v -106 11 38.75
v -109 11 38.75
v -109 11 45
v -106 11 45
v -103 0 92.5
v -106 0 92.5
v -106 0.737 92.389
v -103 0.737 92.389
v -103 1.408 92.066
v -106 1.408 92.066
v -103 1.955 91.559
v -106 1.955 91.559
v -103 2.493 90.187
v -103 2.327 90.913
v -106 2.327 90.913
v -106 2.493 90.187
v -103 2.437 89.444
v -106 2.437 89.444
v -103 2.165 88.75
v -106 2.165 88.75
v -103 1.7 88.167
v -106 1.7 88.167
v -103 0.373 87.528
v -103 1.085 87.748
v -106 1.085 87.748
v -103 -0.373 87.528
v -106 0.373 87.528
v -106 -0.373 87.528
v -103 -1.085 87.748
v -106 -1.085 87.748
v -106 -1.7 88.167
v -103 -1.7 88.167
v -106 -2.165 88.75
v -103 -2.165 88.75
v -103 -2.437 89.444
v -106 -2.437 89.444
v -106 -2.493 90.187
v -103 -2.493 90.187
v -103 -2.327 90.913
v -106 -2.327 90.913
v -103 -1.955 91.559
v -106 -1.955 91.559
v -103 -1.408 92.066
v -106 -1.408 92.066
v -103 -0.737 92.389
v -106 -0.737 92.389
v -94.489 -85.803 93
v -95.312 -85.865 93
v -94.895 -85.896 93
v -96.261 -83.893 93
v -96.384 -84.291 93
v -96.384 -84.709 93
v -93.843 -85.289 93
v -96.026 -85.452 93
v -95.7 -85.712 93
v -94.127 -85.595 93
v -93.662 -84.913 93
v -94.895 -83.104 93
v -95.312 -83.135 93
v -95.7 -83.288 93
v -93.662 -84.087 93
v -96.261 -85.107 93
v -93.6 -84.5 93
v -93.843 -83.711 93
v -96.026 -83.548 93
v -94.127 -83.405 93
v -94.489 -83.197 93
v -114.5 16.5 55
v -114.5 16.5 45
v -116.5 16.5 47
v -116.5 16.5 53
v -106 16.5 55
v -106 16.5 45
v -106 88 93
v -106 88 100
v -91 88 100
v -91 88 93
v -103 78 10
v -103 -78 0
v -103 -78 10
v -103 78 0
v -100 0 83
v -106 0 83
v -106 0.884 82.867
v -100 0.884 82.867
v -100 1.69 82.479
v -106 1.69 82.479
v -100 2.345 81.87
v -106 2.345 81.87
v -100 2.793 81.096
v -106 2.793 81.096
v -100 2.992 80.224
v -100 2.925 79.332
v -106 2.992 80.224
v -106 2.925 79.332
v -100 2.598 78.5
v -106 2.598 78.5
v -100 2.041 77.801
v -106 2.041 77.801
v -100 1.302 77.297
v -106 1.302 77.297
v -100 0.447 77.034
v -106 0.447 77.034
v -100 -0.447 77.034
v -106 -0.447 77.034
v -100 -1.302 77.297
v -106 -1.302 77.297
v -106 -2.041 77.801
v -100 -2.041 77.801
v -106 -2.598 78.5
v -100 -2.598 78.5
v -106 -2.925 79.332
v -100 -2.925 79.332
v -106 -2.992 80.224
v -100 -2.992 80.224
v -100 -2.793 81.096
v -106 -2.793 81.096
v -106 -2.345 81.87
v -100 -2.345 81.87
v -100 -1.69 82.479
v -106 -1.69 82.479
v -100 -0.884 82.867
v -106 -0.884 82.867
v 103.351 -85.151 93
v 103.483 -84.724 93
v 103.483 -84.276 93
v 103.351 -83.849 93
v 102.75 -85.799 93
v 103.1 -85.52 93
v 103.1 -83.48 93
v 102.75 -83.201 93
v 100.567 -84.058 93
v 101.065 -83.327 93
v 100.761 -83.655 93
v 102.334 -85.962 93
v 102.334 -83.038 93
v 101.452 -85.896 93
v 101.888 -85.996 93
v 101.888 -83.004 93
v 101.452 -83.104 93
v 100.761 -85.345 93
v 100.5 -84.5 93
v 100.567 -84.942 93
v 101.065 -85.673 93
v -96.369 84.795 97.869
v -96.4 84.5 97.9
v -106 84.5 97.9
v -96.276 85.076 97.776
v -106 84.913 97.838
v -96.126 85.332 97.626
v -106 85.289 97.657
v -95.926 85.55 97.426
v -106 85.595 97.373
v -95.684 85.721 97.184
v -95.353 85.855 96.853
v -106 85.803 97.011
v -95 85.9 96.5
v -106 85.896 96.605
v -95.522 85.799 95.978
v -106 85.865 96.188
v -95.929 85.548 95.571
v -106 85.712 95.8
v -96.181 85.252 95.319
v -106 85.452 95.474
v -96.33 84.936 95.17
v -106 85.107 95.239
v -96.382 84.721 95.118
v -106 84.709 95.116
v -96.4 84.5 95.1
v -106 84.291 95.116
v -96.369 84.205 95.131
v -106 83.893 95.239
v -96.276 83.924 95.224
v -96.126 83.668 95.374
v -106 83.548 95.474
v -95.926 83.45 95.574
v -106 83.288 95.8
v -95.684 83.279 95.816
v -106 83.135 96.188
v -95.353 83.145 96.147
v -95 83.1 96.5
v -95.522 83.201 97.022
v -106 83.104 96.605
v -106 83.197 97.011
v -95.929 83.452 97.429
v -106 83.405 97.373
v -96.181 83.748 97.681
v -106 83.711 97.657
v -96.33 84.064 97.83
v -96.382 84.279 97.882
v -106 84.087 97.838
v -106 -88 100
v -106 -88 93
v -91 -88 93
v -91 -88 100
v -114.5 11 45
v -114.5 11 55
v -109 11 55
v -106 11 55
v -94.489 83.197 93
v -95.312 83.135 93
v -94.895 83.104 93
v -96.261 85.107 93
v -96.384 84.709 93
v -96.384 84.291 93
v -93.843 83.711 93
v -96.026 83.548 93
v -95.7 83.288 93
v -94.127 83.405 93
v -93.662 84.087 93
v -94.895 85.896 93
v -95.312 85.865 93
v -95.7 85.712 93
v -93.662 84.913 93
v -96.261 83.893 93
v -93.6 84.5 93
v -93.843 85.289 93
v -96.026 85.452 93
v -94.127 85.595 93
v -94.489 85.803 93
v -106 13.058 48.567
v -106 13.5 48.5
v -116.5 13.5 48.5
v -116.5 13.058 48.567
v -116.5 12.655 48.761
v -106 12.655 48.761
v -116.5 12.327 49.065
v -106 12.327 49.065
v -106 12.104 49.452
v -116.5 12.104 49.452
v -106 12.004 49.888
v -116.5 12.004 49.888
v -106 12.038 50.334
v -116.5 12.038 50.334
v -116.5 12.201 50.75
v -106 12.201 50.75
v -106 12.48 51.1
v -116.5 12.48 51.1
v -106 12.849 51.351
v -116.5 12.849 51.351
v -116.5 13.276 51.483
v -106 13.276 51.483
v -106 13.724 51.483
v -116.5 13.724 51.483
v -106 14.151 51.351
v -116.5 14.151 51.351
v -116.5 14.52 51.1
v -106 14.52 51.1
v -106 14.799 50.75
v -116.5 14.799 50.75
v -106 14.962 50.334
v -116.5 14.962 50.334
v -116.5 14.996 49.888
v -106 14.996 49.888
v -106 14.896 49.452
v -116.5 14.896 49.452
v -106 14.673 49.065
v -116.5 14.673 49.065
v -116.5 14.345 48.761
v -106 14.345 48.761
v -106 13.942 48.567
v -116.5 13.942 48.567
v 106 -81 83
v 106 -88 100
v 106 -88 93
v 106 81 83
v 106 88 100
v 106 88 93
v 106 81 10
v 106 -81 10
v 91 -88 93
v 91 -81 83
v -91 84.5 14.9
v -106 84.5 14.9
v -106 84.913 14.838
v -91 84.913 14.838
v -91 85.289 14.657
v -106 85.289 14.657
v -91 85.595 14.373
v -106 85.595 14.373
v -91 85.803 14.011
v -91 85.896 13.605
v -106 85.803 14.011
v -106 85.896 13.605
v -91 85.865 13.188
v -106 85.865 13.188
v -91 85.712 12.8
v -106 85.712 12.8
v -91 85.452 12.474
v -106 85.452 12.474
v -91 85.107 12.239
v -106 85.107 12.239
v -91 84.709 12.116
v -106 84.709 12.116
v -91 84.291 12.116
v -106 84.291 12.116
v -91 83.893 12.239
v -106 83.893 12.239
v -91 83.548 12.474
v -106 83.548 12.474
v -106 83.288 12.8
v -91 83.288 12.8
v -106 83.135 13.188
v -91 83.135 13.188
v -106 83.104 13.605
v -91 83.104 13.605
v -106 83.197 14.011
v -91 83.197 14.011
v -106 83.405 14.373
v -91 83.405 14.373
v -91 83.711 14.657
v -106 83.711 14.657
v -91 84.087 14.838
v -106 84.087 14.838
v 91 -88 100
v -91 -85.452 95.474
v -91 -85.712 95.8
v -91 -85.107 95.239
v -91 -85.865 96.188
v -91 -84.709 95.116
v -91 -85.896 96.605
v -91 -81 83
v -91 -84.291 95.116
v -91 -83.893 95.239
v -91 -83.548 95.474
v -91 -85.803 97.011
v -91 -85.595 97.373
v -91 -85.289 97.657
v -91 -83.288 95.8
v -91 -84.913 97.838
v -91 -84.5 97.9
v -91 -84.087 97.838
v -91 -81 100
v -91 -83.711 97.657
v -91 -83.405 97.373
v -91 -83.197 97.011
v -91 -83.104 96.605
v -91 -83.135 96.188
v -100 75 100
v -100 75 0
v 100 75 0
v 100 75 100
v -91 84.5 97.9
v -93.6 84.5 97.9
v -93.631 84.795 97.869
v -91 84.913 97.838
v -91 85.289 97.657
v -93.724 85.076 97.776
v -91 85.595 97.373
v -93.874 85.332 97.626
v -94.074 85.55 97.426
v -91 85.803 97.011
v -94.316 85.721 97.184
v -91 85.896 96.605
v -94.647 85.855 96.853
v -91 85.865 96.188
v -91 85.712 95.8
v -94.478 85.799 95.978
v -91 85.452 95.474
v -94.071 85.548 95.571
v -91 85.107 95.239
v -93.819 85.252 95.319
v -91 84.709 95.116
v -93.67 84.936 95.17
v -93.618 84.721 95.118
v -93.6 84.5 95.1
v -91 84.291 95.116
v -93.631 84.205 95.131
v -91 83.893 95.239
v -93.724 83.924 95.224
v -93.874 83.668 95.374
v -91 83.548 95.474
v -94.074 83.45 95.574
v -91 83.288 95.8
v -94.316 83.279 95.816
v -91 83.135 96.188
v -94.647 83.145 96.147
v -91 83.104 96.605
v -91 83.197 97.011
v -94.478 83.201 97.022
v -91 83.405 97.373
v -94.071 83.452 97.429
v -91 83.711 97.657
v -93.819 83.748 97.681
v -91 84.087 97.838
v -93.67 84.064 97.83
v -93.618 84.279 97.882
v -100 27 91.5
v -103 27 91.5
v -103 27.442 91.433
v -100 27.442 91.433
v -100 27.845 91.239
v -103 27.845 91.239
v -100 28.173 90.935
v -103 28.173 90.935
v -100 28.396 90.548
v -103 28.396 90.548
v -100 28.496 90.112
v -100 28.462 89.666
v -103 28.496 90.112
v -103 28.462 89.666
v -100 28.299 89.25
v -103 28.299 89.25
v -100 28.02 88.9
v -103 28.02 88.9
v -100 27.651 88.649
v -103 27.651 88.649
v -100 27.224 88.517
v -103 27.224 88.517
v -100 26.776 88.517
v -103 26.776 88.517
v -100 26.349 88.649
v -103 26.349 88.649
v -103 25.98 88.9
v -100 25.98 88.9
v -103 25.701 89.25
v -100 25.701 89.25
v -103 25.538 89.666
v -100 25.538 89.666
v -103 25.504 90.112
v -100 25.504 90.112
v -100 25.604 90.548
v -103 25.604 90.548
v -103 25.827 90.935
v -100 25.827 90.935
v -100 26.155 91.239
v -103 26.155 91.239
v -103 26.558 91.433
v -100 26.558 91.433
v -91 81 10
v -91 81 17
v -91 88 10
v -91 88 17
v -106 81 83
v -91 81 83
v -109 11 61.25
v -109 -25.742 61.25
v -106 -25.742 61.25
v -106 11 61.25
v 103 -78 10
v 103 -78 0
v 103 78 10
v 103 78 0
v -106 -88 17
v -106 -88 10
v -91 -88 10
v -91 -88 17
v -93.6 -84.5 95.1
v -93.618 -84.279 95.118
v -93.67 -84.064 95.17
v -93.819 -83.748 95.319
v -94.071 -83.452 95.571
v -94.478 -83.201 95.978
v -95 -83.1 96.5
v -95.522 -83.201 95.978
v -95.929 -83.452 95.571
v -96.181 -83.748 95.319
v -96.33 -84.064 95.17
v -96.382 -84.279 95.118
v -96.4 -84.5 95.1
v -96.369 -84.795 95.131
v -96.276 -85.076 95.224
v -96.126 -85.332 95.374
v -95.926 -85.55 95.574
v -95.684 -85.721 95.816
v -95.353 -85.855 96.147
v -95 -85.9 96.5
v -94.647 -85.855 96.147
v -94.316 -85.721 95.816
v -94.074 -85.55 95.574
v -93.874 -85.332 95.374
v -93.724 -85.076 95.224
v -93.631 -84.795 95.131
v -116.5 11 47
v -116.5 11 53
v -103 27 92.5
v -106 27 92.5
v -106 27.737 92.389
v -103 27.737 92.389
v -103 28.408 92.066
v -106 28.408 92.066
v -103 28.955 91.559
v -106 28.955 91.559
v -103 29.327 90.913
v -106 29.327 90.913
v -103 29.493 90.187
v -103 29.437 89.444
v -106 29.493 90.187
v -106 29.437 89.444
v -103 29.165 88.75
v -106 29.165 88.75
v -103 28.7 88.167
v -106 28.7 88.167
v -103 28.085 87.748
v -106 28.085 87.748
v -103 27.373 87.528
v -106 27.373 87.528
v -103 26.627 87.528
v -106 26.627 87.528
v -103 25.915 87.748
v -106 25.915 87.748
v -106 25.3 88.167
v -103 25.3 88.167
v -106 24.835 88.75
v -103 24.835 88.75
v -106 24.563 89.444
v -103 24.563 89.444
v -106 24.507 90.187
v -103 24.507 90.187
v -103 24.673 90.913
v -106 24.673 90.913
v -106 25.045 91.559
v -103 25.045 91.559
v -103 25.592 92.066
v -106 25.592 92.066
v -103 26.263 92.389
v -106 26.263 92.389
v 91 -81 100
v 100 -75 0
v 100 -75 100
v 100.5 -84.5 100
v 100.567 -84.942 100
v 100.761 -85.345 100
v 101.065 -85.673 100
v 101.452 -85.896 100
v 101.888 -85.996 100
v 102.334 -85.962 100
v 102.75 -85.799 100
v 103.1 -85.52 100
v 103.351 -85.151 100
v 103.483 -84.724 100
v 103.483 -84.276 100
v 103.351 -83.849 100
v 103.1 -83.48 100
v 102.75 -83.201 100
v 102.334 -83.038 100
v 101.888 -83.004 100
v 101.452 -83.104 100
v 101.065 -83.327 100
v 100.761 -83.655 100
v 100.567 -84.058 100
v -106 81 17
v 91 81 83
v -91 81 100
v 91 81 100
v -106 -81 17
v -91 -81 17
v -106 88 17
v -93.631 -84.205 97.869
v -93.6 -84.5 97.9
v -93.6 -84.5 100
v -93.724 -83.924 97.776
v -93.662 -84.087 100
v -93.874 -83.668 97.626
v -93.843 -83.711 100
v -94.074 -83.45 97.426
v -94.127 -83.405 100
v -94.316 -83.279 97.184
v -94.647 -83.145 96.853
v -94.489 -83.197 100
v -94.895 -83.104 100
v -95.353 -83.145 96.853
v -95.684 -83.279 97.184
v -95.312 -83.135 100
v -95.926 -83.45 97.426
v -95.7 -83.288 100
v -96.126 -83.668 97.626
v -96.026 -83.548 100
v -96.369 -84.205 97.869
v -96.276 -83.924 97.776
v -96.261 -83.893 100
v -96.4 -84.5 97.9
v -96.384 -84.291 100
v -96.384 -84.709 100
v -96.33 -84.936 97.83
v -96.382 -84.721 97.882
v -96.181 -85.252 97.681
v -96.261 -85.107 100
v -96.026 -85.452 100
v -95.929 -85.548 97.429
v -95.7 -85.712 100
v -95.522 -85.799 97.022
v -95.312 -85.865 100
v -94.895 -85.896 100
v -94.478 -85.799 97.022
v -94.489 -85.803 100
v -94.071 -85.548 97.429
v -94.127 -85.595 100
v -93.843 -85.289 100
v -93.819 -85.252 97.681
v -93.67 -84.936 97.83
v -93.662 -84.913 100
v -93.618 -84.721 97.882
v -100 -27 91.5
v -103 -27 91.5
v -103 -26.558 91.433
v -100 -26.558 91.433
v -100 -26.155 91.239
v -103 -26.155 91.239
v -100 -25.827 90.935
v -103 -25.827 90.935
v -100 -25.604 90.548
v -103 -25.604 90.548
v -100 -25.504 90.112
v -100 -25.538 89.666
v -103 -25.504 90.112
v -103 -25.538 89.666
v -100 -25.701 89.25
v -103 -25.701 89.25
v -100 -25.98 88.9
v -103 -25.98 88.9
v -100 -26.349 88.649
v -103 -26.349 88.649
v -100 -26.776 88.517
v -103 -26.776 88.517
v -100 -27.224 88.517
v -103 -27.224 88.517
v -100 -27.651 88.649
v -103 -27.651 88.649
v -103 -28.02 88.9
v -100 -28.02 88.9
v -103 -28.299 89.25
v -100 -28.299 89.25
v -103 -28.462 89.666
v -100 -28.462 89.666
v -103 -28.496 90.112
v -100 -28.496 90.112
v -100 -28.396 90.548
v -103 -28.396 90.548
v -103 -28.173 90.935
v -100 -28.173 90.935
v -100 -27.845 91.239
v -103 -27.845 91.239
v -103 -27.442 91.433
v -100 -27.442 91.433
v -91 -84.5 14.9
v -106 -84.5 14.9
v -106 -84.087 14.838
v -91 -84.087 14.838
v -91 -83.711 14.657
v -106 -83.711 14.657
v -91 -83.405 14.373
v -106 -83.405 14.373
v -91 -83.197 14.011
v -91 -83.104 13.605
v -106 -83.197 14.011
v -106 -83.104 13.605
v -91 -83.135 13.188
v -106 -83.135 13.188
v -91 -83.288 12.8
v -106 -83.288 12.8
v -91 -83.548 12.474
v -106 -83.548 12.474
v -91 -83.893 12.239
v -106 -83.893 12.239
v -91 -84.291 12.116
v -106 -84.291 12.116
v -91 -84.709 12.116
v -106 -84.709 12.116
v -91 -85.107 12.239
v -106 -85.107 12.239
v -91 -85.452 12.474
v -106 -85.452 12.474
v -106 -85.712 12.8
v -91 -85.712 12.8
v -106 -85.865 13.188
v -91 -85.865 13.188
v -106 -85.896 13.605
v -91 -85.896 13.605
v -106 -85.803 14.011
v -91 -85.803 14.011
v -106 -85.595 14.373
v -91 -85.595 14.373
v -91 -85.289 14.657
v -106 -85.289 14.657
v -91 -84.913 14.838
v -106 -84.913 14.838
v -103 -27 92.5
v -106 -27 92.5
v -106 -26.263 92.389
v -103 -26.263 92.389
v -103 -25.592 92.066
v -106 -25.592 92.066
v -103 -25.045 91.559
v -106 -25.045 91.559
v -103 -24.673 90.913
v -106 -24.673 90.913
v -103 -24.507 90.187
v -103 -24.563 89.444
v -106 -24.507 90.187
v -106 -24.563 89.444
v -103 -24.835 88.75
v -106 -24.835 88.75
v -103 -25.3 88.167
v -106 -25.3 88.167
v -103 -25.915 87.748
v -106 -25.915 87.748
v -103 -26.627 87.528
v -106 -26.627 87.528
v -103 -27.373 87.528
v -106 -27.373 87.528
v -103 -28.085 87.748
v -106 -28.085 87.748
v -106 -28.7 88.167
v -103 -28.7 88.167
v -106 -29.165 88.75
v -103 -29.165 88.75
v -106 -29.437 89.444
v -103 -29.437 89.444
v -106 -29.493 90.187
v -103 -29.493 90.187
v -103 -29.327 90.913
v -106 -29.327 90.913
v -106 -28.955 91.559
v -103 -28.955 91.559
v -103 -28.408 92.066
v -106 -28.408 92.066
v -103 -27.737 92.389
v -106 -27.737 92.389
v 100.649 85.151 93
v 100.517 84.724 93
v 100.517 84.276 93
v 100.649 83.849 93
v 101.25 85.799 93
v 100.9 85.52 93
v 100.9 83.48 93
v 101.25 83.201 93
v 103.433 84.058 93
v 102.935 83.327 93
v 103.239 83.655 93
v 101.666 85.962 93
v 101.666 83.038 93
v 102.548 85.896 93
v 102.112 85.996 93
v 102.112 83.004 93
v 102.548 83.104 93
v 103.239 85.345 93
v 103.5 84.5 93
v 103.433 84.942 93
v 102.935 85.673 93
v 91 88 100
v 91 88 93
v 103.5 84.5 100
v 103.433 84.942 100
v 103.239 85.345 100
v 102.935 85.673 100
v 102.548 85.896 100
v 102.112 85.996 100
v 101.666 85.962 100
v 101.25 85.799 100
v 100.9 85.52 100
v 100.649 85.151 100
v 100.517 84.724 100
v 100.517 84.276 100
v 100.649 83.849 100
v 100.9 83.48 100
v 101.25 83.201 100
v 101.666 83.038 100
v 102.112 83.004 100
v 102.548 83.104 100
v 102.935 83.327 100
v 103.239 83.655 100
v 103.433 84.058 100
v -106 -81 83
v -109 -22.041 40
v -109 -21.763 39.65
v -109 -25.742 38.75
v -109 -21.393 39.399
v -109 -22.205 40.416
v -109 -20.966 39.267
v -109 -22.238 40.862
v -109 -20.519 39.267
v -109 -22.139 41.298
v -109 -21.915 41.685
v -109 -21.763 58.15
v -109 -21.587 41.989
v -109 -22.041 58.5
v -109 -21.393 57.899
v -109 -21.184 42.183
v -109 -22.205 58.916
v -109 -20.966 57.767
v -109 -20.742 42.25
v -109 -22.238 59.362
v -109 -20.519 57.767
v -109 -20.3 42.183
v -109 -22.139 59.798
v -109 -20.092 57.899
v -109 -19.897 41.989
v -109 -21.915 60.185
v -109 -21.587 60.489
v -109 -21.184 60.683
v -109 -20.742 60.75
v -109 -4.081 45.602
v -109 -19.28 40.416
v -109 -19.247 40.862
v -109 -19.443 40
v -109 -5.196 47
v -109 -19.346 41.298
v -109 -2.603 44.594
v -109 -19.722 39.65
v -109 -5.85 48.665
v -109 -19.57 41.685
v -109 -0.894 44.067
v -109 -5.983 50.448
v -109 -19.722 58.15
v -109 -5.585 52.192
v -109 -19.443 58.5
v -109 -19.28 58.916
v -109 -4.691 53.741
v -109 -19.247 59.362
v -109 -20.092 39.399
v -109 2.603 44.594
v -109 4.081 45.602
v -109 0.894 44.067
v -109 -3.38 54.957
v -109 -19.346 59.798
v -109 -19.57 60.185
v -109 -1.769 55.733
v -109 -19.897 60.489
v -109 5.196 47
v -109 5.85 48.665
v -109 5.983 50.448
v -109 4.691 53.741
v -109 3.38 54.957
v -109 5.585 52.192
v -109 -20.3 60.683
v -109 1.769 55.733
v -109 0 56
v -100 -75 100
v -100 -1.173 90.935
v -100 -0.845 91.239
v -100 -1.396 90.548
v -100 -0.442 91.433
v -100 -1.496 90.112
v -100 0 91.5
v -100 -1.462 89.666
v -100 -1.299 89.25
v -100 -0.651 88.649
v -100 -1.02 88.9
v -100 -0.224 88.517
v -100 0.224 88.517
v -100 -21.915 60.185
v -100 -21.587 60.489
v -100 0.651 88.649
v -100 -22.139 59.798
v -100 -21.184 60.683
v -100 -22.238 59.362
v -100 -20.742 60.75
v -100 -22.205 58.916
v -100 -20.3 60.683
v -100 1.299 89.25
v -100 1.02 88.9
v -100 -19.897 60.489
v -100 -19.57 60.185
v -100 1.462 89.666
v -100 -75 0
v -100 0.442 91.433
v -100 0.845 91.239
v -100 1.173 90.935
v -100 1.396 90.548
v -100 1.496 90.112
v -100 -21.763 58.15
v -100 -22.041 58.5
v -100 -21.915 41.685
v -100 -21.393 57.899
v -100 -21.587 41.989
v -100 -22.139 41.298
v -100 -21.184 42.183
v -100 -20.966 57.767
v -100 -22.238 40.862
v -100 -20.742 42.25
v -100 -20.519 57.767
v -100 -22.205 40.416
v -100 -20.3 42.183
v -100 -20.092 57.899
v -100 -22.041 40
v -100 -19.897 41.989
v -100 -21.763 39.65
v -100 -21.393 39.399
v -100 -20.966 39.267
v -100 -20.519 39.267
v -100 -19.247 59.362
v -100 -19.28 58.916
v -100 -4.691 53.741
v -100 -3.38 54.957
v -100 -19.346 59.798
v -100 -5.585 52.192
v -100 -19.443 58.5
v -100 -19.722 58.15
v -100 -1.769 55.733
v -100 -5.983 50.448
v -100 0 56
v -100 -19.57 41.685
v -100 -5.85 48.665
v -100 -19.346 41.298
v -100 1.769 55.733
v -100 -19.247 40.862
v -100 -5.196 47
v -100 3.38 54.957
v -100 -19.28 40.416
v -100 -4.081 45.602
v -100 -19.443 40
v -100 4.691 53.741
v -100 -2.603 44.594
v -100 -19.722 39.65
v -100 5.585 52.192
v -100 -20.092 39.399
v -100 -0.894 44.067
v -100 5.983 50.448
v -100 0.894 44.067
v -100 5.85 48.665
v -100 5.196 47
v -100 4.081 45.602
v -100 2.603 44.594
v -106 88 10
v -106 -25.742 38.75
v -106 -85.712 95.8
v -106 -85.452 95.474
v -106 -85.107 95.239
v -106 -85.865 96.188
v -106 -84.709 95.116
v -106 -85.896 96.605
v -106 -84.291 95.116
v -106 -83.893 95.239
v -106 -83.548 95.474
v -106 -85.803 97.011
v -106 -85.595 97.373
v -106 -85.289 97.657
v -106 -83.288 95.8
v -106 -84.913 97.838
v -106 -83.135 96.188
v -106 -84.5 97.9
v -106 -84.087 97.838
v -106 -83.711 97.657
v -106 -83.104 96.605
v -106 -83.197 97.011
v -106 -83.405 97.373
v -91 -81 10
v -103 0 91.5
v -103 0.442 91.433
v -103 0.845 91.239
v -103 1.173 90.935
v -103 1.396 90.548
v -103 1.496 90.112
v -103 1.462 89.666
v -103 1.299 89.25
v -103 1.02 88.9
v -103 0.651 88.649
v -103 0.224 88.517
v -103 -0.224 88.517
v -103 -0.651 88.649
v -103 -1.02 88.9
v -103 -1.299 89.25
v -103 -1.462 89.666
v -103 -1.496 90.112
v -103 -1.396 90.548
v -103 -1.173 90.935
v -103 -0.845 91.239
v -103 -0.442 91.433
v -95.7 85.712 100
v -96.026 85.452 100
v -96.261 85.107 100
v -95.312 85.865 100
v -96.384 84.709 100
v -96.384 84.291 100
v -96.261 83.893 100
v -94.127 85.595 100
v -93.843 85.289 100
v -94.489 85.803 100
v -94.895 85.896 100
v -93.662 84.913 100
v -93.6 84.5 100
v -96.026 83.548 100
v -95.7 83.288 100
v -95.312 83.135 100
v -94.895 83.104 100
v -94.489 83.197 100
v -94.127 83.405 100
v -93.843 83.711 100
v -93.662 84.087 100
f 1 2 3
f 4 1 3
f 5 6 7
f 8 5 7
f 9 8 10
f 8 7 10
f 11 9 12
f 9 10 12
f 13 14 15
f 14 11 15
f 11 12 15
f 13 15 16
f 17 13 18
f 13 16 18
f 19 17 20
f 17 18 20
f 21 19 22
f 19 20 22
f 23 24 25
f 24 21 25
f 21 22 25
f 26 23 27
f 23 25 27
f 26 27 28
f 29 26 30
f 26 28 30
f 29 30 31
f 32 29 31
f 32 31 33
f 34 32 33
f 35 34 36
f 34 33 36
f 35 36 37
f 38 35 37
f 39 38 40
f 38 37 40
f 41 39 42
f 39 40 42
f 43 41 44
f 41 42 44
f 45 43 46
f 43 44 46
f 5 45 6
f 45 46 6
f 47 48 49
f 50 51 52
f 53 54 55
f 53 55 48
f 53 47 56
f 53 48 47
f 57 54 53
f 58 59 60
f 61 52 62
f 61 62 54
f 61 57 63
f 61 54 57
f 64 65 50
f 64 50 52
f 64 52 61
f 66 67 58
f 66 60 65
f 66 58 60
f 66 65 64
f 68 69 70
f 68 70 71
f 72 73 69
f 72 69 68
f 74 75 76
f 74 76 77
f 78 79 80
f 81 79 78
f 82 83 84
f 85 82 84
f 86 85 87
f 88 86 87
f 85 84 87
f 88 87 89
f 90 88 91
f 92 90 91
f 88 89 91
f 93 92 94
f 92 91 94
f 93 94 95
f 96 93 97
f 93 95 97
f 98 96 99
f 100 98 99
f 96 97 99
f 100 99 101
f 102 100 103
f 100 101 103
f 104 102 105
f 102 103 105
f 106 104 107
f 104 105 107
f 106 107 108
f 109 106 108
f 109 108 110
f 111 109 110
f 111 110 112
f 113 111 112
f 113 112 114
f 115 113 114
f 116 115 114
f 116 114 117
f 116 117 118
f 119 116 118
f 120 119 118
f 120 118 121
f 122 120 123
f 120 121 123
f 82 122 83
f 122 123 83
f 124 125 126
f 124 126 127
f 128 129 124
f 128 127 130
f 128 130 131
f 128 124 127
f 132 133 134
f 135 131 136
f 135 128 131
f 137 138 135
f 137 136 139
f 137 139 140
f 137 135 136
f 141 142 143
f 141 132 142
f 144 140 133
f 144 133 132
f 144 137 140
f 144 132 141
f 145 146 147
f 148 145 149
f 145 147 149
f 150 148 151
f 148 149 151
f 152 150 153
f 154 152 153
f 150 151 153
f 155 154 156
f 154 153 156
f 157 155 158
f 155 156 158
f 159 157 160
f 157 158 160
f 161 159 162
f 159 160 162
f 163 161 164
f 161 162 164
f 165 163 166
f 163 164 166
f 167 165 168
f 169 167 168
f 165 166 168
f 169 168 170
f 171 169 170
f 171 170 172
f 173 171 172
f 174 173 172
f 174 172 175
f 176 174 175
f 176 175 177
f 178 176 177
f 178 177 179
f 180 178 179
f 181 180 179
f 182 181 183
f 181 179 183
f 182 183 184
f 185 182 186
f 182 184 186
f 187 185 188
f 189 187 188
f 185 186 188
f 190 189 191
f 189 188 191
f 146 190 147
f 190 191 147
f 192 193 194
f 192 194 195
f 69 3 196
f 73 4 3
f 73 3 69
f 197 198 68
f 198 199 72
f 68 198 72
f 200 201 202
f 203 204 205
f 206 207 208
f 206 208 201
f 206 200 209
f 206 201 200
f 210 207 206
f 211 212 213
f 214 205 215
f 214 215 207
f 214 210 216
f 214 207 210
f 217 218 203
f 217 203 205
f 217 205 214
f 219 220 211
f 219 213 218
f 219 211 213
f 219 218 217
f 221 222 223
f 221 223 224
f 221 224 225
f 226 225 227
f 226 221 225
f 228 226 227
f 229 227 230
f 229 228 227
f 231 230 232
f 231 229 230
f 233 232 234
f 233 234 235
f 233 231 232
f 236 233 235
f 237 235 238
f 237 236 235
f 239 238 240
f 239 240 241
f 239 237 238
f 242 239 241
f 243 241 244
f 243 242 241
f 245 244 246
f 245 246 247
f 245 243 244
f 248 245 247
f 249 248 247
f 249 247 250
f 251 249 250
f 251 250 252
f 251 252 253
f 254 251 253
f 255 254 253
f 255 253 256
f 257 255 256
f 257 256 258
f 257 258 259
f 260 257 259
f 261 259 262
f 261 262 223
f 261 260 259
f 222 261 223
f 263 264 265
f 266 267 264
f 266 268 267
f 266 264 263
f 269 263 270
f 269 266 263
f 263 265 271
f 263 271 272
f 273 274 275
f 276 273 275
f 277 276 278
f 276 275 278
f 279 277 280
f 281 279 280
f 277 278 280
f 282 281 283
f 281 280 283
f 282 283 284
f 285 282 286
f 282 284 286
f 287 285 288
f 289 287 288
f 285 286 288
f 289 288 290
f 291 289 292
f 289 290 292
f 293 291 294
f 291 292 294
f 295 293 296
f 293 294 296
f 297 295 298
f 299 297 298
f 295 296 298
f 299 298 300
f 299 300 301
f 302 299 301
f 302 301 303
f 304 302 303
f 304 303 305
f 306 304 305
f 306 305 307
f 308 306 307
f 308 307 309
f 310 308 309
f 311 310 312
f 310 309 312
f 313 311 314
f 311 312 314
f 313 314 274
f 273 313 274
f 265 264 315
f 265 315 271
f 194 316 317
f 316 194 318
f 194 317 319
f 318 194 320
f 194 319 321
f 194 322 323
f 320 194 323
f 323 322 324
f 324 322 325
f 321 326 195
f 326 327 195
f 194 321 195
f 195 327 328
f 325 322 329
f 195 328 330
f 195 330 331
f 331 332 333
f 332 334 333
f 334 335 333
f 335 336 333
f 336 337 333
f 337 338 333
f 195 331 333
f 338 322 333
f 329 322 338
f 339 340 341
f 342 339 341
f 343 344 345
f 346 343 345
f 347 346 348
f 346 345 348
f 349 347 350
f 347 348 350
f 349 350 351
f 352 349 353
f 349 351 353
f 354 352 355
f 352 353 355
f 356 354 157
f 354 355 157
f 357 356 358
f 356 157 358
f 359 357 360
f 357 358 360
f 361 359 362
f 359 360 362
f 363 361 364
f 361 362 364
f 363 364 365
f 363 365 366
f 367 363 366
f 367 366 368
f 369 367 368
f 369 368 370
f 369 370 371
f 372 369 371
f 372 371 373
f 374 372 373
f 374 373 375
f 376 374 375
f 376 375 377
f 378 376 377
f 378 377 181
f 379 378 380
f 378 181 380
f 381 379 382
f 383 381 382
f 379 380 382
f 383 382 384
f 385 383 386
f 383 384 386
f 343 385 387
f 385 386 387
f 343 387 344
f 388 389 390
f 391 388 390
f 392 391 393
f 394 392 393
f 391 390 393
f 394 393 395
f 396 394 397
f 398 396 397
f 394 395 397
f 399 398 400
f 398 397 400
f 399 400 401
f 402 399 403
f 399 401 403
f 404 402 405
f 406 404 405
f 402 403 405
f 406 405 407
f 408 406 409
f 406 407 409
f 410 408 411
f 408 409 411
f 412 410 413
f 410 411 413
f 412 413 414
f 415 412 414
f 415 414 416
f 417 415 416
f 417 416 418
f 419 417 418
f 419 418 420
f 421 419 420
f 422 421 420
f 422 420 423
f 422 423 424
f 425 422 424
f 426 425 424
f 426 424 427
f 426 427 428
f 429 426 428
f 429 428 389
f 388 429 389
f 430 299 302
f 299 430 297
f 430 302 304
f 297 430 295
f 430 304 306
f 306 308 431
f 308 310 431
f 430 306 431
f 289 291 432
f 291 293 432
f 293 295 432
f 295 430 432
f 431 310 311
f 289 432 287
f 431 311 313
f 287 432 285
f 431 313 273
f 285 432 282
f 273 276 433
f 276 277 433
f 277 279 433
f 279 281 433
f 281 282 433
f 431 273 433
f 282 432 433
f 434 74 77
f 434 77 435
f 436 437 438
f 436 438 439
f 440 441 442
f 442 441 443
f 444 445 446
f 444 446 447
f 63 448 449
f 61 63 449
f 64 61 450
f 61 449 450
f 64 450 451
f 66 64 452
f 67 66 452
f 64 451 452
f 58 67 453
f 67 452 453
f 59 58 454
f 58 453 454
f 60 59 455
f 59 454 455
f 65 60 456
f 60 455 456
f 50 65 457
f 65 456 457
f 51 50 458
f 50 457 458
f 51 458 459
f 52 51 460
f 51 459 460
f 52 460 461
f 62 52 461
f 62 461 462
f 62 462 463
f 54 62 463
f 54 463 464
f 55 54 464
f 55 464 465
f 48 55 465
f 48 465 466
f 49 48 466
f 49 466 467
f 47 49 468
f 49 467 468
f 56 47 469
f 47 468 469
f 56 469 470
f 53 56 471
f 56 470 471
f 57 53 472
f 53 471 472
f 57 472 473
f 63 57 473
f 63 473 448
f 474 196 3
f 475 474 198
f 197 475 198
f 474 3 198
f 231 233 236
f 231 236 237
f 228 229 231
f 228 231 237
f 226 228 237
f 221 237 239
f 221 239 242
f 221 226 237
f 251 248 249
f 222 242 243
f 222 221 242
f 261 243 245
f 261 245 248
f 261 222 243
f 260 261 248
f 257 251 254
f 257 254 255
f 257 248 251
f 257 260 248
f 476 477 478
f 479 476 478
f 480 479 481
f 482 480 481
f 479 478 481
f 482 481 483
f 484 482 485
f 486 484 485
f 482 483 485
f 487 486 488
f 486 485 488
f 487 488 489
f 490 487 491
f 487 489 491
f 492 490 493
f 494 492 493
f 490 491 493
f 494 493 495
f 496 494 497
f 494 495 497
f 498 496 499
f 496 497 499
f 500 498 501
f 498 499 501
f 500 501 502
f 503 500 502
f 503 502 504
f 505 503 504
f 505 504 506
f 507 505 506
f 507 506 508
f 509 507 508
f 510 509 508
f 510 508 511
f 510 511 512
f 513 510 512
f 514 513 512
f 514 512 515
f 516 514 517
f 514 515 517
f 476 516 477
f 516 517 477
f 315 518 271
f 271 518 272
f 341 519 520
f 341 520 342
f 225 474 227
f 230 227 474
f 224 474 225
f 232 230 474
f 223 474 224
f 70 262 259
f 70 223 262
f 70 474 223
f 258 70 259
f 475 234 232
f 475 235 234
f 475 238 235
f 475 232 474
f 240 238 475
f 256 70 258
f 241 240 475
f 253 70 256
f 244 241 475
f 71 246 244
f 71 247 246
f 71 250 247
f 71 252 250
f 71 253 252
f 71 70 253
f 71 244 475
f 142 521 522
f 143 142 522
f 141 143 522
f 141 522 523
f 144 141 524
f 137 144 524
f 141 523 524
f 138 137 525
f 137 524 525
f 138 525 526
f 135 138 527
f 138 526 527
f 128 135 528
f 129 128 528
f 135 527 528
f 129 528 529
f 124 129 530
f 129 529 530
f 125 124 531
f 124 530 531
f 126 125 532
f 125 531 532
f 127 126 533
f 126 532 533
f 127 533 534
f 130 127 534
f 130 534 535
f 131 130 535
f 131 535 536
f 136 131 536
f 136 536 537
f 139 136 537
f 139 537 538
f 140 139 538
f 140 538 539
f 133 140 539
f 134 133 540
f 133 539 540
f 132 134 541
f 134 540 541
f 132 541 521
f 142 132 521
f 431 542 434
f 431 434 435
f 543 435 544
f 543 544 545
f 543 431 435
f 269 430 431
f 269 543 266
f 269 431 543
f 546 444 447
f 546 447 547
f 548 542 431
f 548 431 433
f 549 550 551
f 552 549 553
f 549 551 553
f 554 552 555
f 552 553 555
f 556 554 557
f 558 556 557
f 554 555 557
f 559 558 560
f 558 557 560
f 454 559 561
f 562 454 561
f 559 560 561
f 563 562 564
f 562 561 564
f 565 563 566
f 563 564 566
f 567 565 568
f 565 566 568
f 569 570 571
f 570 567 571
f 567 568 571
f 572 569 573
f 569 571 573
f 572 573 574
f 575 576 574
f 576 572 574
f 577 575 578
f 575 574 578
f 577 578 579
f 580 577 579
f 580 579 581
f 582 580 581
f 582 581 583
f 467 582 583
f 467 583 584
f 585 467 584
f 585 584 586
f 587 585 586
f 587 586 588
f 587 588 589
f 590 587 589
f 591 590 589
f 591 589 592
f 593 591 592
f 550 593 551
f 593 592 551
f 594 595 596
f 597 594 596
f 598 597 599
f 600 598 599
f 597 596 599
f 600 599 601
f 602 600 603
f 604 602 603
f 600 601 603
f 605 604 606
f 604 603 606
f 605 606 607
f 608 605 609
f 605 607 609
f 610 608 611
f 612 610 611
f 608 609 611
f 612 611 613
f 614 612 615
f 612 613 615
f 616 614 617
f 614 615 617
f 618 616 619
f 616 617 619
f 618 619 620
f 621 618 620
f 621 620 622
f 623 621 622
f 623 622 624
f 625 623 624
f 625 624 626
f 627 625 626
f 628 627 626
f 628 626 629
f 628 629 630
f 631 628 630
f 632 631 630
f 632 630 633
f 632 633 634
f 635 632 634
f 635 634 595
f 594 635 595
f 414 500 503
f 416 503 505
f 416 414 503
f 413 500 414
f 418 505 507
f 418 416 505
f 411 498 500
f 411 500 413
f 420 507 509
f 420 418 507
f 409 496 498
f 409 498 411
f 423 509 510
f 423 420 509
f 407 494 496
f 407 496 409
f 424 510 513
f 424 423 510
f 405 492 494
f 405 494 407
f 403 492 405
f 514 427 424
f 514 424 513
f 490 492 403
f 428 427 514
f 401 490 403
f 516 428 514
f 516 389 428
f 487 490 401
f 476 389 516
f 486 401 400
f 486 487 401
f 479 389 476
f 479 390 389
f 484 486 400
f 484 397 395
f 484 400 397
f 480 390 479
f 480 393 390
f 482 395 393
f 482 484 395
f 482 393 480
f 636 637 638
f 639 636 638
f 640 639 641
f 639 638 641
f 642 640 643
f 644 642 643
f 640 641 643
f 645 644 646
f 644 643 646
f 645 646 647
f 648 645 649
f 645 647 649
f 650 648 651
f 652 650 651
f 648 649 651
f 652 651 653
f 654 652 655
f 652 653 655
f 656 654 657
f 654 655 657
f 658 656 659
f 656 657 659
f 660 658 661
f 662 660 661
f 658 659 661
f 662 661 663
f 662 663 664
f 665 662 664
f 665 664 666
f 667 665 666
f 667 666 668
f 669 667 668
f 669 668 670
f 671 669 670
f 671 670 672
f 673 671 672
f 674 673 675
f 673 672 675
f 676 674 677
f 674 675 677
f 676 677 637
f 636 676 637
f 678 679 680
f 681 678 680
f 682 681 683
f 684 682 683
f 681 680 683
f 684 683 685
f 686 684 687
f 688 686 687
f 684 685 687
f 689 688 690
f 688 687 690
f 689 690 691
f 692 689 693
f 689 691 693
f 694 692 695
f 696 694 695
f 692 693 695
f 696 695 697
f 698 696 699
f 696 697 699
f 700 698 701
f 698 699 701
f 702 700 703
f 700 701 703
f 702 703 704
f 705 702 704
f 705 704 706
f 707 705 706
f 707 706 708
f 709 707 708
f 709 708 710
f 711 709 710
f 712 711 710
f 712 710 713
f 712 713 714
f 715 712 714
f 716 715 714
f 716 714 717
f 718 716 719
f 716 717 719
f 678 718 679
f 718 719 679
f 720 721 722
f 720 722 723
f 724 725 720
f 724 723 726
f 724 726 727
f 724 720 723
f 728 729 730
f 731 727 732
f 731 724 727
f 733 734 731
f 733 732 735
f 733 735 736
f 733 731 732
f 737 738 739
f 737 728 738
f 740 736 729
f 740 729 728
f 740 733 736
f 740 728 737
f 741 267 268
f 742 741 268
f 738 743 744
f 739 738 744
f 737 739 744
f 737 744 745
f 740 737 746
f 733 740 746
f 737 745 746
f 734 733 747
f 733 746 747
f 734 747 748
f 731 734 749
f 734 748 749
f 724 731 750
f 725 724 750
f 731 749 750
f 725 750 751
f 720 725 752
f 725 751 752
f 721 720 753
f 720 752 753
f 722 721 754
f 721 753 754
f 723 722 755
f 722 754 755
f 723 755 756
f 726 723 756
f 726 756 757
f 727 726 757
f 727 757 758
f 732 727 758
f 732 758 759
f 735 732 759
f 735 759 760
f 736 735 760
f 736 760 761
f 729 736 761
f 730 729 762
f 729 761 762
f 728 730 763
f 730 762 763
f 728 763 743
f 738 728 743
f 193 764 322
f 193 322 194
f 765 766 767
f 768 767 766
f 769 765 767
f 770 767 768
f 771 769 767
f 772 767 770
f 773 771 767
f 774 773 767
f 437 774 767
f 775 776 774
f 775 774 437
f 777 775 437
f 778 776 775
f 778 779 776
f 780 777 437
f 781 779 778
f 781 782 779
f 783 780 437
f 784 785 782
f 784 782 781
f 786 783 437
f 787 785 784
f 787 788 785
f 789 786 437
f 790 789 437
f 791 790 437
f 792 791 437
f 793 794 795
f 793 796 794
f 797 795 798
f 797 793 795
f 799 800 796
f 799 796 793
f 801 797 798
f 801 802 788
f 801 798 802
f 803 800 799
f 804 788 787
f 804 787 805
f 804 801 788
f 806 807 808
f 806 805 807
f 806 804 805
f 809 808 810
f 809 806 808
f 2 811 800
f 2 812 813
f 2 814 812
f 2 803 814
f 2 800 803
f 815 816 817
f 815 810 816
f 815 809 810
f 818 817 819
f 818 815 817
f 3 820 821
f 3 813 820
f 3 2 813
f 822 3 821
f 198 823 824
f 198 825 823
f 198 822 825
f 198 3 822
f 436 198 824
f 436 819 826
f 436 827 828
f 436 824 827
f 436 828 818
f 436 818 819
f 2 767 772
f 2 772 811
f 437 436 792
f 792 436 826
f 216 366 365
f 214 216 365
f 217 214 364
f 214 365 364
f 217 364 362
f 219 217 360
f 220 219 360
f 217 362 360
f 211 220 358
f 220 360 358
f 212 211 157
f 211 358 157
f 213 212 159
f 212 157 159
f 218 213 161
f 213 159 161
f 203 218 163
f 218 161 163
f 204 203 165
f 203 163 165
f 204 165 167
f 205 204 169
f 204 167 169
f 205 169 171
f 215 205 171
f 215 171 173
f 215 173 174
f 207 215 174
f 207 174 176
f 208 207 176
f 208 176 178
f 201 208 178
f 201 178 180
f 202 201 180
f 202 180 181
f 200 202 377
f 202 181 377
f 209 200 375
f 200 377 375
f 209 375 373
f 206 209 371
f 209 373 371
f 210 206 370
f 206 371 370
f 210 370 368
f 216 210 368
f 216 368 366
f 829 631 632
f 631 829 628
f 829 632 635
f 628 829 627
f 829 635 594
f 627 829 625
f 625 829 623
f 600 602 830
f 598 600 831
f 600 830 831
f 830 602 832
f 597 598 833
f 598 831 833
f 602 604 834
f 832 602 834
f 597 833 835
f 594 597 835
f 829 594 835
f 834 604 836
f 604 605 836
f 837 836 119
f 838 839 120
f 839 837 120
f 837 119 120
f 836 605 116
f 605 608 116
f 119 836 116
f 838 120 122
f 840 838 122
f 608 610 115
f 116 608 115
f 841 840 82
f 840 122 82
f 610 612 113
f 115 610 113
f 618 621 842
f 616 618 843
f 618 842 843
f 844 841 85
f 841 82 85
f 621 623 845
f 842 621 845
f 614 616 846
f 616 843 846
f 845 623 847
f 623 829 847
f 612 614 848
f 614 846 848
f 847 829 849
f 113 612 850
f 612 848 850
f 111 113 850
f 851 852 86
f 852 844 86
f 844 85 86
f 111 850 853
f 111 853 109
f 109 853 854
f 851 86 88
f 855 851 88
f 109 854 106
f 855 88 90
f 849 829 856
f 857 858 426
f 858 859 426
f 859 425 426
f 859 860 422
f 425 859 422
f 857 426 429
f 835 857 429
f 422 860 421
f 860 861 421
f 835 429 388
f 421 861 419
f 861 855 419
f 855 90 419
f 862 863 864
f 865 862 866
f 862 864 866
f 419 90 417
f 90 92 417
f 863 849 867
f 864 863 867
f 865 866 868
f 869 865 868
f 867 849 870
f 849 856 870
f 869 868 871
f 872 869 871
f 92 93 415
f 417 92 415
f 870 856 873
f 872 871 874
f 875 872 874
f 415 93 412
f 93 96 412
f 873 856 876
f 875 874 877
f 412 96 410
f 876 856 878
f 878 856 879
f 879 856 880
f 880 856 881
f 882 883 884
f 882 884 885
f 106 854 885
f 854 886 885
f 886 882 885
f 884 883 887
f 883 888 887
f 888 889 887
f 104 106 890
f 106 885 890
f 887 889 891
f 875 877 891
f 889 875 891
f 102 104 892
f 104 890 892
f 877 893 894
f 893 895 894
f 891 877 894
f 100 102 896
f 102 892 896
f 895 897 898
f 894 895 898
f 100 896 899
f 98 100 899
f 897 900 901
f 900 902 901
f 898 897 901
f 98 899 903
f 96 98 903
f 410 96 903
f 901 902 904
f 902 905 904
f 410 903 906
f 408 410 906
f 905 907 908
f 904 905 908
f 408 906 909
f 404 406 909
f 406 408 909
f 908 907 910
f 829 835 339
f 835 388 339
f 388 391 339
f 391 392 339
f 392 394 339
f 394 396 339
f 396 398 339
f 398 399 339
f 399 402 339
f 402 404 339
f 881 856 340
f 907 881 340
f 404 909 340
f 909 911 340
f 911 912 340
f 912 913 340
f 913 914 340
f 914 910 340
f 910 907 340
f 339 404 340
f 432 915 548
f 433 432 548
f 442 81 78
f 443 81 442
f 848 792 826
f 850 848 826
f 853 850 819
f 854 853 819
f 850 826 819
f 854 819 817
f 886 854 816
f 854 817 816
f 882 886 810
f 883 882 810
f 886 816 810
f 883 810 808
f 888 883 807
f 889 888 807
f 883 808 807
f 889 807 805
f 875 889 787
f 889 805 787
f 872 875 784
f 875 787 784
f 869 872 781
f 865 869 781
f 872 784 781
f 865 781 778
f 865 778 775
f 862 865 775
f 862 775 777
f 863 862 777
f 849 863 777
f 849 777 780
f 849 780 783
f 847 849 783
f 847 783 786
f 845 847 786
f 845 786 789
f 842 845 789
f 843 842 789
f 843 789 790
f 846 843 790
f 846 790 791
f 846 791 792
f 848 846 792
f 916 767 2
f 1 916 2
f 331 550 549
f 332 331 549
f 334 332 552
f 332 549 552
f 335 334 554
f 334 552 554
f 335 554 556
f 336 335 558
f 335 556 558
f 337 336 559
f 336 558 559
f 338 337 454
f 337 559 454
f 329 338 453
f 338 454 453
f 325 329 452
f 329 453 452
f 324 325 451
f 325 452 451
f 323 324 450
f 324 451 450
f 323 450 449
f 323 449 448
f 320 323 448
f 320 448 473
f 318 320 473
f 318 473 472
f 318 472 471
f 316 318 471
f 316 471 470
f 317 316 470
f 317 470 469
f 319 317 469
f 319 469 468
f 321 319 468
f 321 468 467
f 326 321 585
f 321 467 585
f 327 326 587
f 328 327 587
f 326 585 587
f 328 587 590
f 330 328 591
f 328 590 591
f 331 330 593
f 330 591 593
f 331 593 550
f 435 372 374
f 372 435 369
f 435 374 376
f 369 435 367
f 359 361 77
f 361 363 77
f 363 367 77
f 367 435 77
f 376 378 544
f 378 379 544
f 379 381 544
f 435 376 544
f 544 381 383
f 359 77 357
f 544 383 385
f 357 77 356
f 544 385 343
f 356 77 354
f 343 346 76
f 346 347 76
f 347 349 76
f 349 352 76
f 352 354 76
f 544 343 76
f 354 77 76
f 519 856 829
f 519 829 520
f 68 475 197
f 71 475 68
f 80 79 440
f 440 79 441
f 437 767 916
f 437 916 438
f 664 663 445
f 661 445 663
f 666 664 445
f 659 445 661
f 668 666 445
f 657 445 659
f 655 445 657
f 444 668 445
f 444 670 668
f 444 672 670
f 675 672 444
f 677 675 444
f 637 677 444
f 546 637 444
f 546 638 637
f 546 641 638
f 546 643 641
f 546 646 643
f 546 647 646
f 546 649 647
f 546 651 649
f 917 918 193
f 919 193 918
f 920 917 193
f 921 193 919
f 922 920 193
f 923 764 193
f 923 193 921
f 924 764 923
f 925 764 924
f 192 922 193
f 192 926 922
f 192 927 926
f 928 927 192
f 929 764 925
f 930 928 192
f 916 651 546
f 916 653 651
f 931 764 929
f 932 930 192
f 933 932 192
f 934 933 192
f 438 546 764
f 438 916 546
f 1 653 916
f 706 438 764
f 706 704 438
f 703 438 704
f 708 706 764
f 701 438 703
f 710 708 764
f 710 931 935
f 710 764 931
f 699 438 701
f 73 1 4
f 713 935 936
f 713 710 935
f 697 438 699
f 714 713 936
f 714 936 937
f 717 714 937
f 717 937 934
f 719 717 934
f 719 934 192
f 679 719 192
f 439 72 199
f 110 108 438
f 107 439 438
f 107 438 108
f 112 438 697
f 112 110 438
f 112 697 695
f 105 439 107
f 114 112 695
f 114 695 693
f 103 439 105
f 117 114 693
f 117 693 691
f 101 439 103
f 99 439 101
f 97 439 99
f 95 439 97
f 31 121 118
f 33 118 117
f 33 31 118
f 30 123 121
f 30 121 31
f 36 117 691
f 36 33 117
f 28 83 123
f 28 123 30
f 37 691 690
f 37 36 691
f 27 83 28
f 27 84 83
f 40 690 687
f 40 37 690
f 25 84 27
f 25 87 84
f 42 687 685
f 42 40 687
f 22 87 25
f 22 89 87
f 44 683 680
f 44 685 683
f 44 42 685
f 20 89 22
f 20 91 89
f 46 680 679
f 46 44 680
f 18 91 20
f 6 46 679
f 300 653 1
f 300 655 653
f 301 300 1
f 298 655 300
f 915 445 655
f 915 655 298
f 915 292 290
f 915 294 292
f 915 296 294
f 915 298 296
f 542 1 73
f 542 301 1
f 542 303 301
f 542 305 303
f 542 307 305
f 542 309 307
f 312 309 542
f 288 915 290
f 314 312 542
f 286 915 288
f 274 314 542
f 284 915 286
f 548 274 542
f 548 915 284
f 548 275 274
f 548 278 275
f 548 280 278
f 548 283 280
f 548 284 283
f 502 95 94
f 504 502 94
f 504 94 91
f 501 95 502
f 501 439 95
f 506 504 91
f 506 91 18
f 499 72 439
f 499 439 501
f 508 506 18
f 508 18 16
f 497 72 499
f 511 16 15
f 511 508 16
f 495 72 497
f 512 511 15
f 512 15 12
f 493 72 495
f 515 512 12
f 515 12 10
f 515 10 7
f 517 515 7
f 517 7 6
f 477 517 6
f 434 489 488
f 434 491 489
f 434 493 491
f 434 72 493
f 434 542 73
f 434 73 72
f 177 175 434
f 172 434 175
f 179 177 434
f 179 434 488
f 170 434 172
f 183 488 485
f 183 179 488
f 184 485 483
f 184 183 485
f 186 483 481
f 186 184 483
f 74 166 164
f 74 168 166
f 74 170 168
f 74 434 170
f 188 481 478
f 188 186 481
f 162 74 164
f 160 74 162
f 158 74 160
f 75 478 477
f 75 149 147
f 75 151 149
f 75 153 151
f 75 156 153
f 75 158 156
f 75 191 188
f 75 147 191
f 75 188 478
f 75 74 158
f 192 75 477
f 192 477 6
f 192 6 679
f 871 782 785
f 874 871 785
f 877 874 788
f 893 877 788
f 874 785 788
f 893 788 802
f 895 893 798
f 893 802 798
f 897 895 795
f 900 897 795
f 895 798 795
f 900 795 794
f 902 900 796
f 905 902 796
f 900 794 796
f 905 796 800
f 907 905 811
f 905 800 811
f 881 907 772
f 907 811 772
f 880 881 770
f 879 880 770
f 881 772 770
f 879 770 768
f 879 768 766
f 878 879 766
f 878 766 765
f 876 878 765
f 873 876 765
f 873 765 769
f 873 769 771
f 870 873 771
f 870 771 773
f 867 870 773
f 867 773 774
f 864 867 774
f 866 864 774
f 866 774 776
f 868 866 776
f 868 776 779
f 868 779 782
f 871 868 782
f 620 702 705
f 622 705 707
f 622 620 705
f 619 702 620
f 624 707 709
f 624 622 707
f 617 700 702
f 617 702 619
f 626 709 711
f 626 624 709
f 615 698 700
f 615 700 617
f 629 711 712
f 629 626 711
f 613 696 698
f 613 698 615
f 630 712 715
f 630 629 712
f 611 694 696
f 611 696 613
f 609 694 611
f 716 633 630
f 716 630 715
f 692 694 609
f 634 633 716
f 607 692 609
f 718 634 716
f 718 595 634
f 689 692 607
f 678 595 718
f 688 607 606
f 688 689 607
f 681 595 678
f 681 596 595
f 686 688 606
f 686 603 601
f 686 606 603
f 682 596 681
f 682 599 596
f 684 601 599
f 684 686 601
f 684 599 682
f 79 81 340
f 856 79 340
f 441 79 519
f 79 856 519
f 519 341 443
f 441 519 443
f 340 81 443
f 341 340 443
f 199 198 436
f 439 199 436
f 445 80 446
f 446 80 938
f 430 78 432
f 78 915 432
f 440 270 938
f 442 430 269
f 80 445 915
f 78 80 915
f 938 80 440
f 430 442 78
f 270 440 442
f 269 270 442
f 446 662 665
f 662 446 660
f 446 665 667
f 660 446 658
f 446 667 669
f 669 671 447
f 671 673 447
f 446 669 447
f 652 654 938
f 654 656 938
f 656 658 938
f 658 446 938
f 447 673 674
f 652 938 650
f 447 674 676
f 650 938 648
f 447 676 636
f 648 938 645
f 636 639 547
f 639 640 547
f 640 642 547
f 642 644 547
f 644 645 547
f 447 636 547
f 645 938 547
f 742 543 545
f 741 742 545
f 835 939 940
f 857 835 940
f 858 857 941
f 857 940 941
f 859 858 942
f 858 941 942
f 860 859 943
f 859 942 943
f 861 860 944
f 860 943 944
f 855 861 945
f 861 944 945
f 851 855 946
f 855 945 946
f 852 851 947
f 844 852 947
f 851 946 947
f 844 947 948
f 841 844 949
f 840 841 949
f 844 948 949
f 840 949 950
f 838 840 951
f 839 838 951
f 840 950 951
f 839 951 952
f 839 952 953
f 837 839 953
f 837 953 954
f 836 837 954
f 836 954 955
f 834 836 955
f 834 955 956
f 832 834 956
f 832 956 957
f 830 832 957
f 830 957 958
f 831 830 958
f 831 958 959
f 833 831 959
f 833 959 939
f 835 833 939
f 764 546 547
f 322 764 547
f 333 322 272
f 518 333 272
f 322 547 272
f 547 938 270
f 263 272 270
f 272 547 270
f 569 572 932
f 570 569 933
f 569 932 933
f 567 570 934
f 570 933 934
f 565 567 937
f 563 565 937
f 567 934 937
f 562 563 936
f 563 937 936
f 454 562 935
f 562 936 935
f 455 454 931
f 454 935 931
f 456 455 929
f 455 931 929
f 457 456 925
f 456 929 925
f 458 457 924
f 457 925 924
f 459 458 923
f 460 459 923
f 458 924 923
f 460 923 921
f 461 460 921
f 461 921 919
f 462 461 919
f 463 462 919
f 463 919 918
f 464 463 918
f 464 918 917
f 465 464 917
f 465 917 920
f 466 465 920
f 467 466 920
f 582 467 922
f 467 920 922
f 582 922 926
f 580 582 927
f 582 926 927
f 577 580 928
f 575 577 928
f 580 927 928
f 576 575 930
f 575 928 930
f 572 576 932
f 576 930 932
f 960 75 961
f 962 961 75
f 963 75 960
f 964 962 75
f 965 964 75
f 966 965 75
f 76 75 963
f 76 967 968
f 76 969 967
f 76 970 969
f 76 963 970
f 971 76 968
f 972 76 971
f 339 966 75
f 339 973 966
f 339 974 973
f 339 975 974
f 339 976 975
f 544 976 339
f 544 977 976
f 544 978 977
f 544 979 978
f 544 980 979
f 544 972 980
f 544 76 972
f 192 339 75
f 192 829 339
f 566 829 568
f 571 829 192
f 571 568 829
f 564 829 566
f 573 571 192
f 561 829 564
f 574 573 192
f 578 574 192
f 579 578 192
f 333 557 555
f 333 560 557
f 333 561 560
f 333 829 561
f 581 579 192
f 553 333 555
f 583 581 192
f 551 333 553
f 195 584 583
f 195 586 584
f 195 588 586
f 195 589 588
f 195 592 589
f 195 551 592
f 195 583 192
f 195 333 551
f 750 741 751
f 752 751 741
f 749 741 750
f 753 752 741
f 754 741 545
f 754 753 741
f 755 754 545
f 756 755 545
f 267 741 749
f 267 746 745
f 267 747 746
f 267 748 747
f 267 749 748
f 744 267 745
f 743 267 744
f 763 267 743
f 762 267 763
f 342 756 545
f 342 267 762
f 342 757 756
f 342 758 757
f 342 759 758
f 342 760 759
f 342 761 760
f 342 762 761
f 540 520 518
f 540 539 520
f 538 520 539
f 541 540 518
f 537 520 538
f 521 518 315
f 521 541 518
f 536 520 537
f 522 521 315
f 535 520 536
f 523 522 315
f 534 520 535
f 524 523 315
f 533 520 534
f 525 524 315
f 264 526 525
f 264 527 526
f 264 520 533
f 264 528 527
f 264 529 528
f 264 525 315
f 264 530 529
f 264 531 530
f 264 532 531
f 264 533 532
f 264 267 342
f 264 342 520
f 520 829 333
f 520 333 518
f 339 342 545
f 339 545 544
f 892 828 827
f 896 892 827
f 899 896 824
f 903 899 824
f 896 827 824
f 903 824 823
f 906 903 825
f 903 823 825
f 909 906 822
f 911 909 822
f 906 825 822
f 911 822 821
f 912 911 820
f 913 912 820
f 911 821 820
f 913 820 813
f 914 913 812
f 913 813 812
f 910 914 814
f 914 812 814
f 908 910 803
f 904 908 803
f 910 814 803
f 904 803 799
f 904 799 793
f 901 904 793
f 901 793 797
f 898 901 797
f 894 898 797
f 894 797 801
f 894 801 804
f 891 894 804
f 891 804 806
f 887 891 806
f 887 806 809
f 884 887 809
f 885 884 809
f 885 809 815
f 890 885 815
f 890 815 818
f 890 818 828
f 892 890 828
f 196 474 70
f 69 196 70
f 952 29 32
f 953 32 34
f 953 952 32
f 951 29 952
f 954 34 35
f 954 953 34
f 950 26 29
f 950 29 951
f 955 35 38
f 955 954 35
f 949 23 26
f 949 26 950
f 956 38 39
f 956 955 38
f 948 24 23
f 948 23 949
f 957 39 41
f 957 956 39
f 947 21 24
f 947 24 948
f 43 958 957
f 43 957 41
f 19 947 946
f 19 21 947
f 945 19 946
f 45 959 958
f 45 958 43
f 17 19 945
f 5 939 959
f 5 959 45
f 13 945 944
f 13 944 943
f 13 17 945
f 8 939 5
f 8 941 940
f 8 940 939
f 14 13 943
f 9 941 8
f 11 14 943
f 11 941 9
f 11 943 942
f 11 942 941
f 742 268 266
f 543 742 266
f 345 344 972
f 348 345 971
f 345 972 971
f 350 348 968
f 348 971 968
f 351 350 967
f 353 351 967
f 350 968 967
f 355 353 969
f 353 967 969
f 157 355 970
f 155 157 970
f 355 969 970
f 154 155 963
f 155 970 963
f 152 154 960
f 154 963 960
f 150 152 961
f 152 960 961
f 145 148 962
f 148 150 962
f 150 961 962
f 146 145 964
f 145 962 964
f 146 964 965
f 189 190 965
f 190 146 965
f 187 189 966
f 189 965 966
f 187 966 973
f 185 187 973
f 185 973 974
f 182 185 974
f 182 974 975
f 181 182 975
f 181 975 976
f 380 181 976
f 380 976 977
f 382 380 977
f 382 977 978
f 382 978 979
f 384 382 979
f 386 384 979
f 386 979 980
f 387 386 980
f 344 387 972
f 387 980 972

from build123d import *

# Parameters (mm, degrees)
SKETCH1_W           = 212
SKETCH1_H           = 162
SKETCH1_W_2         = 206
SKETCH1_H_2         = 156
SKETCH1_W_3         = 200
SKETCH1_H_3         = 150
BOSS_EXTRUDE1_DEPTH = 100
SKETCH1_4_W         = 212
SKETCH1_4_H         = 162
SKETCH1_4_W_2       = 206
SKETCH1_4_H_2       = 156
CUT_EXTRUDE2_DEPTH  = 10
SKETCH2_5_R         = 1.5
SKETCH2_5_R_2       = 6
CUT_EXTRUDE3_DEPTH  = 6
SKETCH2_W           = 10
SKETCH2_H           = 5.5
SKETCH2_R           = 1.5
BOSS_EXTRUDE4_DEPTH = 10.5
CHAMFER1_SIZE       = 2
BOSS_EXTRUDE5_START = 3
SKETCH2_12_W        = 22.5
SKETCH2_12_H        = 36.742349428
SKETCH2_12_R        = 6
SKETCH2_12_R_2      = 1.5
BOSS_EXTRUDE5_DEPTH = 3
SKETCH2_13_R        = 1.5
SKETCH2_13_R_2      = 3
CUT_EXTRUDE6_DEPTH  = 6
SKETCH2_14_R        = 2.5
SKETCH2_14_R_2      = 1.5
CUT_EXTRUDE7_DEPTH  = 3
SKETCH2_18_R        = 1.4
SKETCH2_18_W        = 7
SKETCH2_18_H        = 7
BOSS_EXTRUDE7_DEPTH = 15
BOSS_EXTRUDE8_DEPTH = 15
SKETCH13_R          = 1.4
SKETCH13_R_2        = 1.5
CUT_EXTRUDE14_DEPTH = 7


with BuildPart() as part:
    # Sketch1 → Boss-Extrude1 (new body)
    # profile 1 of 2: a face of its own
    with BuildSketch(Plane.XY):
        Rectangle(SKETCH1_W, SKETCH1_H)
        Rectangle(SKETCH1_W_2, SKETCH1_H_2, mode=Mode.SUBTRACT)
    # profile 2 of 2: a face of its own
    with BuildSketch(Plane.XY):
        Rectangle(SKETCH1_W_2, SKETCH1_H_2)
        Rectangle(SKETCH1_W_3, SKETCH1_H_3, mode=Mode.SUBTRACT)
    extrude(amount=BOSS_EXTRUDE1_DEPTH)

    # Sketch1<4> → Cut-Extrude2 (cut)
    with BuildSketch(Plane.XY):
        Rectangle(SKETCH1_4_W, SKETCH1_4_H)
        Rectangle(SKETCH1_4_W_2, SKETCH1_4_H_2, mode=Mode.SUBTRACT)
    extrude(amount=CUT_EXTRUDE2_DEPTH, mode=Mode.SUBTRACT)

    # Sketch2<5> → Cut-Extrude3 (cut)
    with BuildSketch(Plane.ZY.offset(106)):
        with Locations((40.75, -20.742349428)):
            Circle(SKETCH2_5_R)
        with Locations((59.25, -20.742349428)):
            Circle(SKETCH2_5_R)
        with Locations((50, 0)):
            Circle(SKETCH2_5_R_2)
    extrude(amount=-CUT_EXTRUDE3_DEPTH, mode=Mode.SUBTRACT)

    # Sketch2 → Boss-Extrude4 (add)
    with BuildSketch(Plane.ZY.offset(106)):
        with Locations((50, 13.75)):
            Rectangle(SKETCH2_W, SKETCH2_H)
        with Locations(Location((50, 13.5, 0), (0, 0, 180))):
            Circle(SKETCH2_R, mode=Mode.SUBTRACT)
    extrude(amount=BOSS_EXTRUDE4_DEPTH)

    # Chamfer1
    chamfer1_edges = [part.edges().sort_by_distance(p)[0] for p in [
        (-116.5, 13.75, 55),
        (-116.5, 13.75, 45),
    ]]
    chamfer(chamfer1_edges, length=CHAMFER1_SIZE)

    # Sketch2<12> → Boss-Extrude5 (add)
    with BuildSketch(Plane.ZY.offset(106).offset(BOSS_EXTRUDE5_START)):
        with Locations((50, -7.371174714)):
            Rectangle(SKETCH2_12_W, SKETCH2_12_H)
        with Locations((50, 0)):
            Circle(SKETCH2_12_R, mode=Mode.SUBTRACT)
        with Locations((40.75, -20.742349428)):
            Circle(SKETCH2_12_R_2, mode=Mode.SUBTRACT)
        with Locations((59.25, -20.742349428)):
            Circle(SKETCH2_12_R_2, mode=Mode.SUBTRACT)
    extrude(amount=-BOSS_EXTRUDE5_DEPTH)

    # Sketch2<13> → Cut-Extrude6 (cut)
    with BuildSketch(Plane.ZY.offset(106)):
        with Locations((90, 0)):
            Circle(SKETCH2_13_R)
        with Locations((90, 27)):
            Circle(SKETCH2_13_R)
        with Locations((90, -27)):
            Circle(SKETCH2_13_R)
        with Locations((80, 0)):
            Circle(SKETCH2_13_R_2)
    extrude(amount=-CUT_EXTRUDE6_DEPTH, mode=Mode.SUBTRACT)

    # Sketch2<14> → Cut-Extrude7 (cut)
    # profile 1 of 5: a face of its own
    with BuildSketch(Plane.ZY.offset(106)):
        with Locations((90, 27)):
            Circle(SKETCH2_14_R)
        with Locations((90, 27)):
            Circle(SKETCH2_14_R_2, mode=Mode.SUBTRACT)
    # profile 2 of 5: a face of its own
    with BuildSketch(Plane.ZY.offset(106)):
        with Locations((90, 0)):
            Circle(SKETCH2_14_R)
        with Locations((90, 0)):
            Circle(SKETCH2_14_R_2, mode=Mode.SUBTRACT)
    # profile 3 of 5: a face of its own
    with BuildSketch(Plane.ZY.offset(106)):
        with Locations((90, -27)):
            Circle(SKETCH2_14_R)
        with Locations((90, -27)):
            Circle(SKETCH2_14_R_2, mode=Mode.SUBTRACT)
    # profile 4 of 5: a face of its own
    with BuildSketch(Plane.ZY.offset(106)):
        with BuildLine():
            ThreePointArc((92.5, 0), (90, 2.5), (87.5, 0))
            Line((87.5, 0), (88.5, 0))
            ThreePointArc((88.5, 0), (90, 1.5), (91.5, 0))
            Line((91.5, 0), (92.5, 0))
        make_face()
    # profile 5 of 5: a face of its own
    with BuildSketch(Plane.ZY.offset(106)):
        with BuildLine():
            Line((88.5, 0), (87.5, 0))
            ThreePointArc((87.5, 0), (90, -2.5), (92.5, 0))
            Line((92.5, 0), (91.5, 0))
            ThreePointArc((91.5, 0), (90, -1.5), (88.5, 0))
        make_face()
    extrude(amount=-CUT_EXTRUDE7_DEPTH, mode=Mode.SUBTRACT)

    # Sketch2<18> → Boss-Extrude7 (add)
    # profile 1 of 4: a face of its own
    with BuildSketch(Plane.ZY.offset(106)):
        Polygon((93, 88), (83, 81), (93, 81), (100, 81), (100, 88), align=None)
        with Locations((96.5, 84.5)):
            Circle(SKETCH2_18_R, mode=Mode.SUBTRACT)
    # profile 2 of 4: a face of its own
    with BuildSketch(Plane.ZY.offset(106)):
        with Locations((13.5, 84.5)):
            Rectangle(SKETCH2_18_W, SKETCH2_18_H)
        with Locations((13.5, 84.5)):
            Circle(SKETCH2_18_R, mode=Mode.SUBTRACT)
    # profile 3 of 4: a face of its own
    with BuildSketch(Plane.ZY.offset(106)):
        with Locations((13.5, -84.5)):
            Rectangle(SKETCH2_18_W, SKETCH2_18_H)
        with Locations((13.5, -84.5)):
            Circle(SKETCH2_18_R, mode=Mode.SUBTRACT)
    # profile 4 of 4: a face of its own
    with BuildSketch(Plane.ZY.offset(106)):
        Polygon((93, -81), (83, -81), (93, -88), (100, -88), (100, -81), align=None)
        with Locations((96.5, -84.5)):
            Circle(SKETCH2_18_R, mode=Mode.SUBTRACT)
    extrude(amount=-BOSS_EXTRUDE7_DEPTH)

    # Sketch12 → Boss-Extrude8 (add)
    with BuildSketch(Plane(origin=(106, 0, 0), x_dir=(0, 0, -1), z_dir=(1, 0, 0))):
        Polygon((-100, -81), (-100, -88), (-93, -88), (-83, -81), align=None)
        Polygon((-100, 81), (-100, 88), (-93, 88), (-83, 81), align=None)
    extrude(amount=-BOSS_EXTRUDE8_DEPTH)

    # Sketch13 → Cut-Extrude14 (cut)
    with BuildSketch(Plane.XY.offset(100)):
        with Locations((-95, 84.5)):
            Circle(SKETCH13_R)
        with Locations((-95, -84.5)):
            Circle(SKETCH13_R)
        with Locations((102, 84.5)):
            Circle(SKETCH13_R_2)
        with Locations(Location((102, -84.5, 0), (0, 0, 180))):
            Circle(SKETCH13_R_2)
    extrude(amount=-CUT_EXTRUDE14_DEPTH, mode=Mode.SUBTRACT)


solid = part.part
